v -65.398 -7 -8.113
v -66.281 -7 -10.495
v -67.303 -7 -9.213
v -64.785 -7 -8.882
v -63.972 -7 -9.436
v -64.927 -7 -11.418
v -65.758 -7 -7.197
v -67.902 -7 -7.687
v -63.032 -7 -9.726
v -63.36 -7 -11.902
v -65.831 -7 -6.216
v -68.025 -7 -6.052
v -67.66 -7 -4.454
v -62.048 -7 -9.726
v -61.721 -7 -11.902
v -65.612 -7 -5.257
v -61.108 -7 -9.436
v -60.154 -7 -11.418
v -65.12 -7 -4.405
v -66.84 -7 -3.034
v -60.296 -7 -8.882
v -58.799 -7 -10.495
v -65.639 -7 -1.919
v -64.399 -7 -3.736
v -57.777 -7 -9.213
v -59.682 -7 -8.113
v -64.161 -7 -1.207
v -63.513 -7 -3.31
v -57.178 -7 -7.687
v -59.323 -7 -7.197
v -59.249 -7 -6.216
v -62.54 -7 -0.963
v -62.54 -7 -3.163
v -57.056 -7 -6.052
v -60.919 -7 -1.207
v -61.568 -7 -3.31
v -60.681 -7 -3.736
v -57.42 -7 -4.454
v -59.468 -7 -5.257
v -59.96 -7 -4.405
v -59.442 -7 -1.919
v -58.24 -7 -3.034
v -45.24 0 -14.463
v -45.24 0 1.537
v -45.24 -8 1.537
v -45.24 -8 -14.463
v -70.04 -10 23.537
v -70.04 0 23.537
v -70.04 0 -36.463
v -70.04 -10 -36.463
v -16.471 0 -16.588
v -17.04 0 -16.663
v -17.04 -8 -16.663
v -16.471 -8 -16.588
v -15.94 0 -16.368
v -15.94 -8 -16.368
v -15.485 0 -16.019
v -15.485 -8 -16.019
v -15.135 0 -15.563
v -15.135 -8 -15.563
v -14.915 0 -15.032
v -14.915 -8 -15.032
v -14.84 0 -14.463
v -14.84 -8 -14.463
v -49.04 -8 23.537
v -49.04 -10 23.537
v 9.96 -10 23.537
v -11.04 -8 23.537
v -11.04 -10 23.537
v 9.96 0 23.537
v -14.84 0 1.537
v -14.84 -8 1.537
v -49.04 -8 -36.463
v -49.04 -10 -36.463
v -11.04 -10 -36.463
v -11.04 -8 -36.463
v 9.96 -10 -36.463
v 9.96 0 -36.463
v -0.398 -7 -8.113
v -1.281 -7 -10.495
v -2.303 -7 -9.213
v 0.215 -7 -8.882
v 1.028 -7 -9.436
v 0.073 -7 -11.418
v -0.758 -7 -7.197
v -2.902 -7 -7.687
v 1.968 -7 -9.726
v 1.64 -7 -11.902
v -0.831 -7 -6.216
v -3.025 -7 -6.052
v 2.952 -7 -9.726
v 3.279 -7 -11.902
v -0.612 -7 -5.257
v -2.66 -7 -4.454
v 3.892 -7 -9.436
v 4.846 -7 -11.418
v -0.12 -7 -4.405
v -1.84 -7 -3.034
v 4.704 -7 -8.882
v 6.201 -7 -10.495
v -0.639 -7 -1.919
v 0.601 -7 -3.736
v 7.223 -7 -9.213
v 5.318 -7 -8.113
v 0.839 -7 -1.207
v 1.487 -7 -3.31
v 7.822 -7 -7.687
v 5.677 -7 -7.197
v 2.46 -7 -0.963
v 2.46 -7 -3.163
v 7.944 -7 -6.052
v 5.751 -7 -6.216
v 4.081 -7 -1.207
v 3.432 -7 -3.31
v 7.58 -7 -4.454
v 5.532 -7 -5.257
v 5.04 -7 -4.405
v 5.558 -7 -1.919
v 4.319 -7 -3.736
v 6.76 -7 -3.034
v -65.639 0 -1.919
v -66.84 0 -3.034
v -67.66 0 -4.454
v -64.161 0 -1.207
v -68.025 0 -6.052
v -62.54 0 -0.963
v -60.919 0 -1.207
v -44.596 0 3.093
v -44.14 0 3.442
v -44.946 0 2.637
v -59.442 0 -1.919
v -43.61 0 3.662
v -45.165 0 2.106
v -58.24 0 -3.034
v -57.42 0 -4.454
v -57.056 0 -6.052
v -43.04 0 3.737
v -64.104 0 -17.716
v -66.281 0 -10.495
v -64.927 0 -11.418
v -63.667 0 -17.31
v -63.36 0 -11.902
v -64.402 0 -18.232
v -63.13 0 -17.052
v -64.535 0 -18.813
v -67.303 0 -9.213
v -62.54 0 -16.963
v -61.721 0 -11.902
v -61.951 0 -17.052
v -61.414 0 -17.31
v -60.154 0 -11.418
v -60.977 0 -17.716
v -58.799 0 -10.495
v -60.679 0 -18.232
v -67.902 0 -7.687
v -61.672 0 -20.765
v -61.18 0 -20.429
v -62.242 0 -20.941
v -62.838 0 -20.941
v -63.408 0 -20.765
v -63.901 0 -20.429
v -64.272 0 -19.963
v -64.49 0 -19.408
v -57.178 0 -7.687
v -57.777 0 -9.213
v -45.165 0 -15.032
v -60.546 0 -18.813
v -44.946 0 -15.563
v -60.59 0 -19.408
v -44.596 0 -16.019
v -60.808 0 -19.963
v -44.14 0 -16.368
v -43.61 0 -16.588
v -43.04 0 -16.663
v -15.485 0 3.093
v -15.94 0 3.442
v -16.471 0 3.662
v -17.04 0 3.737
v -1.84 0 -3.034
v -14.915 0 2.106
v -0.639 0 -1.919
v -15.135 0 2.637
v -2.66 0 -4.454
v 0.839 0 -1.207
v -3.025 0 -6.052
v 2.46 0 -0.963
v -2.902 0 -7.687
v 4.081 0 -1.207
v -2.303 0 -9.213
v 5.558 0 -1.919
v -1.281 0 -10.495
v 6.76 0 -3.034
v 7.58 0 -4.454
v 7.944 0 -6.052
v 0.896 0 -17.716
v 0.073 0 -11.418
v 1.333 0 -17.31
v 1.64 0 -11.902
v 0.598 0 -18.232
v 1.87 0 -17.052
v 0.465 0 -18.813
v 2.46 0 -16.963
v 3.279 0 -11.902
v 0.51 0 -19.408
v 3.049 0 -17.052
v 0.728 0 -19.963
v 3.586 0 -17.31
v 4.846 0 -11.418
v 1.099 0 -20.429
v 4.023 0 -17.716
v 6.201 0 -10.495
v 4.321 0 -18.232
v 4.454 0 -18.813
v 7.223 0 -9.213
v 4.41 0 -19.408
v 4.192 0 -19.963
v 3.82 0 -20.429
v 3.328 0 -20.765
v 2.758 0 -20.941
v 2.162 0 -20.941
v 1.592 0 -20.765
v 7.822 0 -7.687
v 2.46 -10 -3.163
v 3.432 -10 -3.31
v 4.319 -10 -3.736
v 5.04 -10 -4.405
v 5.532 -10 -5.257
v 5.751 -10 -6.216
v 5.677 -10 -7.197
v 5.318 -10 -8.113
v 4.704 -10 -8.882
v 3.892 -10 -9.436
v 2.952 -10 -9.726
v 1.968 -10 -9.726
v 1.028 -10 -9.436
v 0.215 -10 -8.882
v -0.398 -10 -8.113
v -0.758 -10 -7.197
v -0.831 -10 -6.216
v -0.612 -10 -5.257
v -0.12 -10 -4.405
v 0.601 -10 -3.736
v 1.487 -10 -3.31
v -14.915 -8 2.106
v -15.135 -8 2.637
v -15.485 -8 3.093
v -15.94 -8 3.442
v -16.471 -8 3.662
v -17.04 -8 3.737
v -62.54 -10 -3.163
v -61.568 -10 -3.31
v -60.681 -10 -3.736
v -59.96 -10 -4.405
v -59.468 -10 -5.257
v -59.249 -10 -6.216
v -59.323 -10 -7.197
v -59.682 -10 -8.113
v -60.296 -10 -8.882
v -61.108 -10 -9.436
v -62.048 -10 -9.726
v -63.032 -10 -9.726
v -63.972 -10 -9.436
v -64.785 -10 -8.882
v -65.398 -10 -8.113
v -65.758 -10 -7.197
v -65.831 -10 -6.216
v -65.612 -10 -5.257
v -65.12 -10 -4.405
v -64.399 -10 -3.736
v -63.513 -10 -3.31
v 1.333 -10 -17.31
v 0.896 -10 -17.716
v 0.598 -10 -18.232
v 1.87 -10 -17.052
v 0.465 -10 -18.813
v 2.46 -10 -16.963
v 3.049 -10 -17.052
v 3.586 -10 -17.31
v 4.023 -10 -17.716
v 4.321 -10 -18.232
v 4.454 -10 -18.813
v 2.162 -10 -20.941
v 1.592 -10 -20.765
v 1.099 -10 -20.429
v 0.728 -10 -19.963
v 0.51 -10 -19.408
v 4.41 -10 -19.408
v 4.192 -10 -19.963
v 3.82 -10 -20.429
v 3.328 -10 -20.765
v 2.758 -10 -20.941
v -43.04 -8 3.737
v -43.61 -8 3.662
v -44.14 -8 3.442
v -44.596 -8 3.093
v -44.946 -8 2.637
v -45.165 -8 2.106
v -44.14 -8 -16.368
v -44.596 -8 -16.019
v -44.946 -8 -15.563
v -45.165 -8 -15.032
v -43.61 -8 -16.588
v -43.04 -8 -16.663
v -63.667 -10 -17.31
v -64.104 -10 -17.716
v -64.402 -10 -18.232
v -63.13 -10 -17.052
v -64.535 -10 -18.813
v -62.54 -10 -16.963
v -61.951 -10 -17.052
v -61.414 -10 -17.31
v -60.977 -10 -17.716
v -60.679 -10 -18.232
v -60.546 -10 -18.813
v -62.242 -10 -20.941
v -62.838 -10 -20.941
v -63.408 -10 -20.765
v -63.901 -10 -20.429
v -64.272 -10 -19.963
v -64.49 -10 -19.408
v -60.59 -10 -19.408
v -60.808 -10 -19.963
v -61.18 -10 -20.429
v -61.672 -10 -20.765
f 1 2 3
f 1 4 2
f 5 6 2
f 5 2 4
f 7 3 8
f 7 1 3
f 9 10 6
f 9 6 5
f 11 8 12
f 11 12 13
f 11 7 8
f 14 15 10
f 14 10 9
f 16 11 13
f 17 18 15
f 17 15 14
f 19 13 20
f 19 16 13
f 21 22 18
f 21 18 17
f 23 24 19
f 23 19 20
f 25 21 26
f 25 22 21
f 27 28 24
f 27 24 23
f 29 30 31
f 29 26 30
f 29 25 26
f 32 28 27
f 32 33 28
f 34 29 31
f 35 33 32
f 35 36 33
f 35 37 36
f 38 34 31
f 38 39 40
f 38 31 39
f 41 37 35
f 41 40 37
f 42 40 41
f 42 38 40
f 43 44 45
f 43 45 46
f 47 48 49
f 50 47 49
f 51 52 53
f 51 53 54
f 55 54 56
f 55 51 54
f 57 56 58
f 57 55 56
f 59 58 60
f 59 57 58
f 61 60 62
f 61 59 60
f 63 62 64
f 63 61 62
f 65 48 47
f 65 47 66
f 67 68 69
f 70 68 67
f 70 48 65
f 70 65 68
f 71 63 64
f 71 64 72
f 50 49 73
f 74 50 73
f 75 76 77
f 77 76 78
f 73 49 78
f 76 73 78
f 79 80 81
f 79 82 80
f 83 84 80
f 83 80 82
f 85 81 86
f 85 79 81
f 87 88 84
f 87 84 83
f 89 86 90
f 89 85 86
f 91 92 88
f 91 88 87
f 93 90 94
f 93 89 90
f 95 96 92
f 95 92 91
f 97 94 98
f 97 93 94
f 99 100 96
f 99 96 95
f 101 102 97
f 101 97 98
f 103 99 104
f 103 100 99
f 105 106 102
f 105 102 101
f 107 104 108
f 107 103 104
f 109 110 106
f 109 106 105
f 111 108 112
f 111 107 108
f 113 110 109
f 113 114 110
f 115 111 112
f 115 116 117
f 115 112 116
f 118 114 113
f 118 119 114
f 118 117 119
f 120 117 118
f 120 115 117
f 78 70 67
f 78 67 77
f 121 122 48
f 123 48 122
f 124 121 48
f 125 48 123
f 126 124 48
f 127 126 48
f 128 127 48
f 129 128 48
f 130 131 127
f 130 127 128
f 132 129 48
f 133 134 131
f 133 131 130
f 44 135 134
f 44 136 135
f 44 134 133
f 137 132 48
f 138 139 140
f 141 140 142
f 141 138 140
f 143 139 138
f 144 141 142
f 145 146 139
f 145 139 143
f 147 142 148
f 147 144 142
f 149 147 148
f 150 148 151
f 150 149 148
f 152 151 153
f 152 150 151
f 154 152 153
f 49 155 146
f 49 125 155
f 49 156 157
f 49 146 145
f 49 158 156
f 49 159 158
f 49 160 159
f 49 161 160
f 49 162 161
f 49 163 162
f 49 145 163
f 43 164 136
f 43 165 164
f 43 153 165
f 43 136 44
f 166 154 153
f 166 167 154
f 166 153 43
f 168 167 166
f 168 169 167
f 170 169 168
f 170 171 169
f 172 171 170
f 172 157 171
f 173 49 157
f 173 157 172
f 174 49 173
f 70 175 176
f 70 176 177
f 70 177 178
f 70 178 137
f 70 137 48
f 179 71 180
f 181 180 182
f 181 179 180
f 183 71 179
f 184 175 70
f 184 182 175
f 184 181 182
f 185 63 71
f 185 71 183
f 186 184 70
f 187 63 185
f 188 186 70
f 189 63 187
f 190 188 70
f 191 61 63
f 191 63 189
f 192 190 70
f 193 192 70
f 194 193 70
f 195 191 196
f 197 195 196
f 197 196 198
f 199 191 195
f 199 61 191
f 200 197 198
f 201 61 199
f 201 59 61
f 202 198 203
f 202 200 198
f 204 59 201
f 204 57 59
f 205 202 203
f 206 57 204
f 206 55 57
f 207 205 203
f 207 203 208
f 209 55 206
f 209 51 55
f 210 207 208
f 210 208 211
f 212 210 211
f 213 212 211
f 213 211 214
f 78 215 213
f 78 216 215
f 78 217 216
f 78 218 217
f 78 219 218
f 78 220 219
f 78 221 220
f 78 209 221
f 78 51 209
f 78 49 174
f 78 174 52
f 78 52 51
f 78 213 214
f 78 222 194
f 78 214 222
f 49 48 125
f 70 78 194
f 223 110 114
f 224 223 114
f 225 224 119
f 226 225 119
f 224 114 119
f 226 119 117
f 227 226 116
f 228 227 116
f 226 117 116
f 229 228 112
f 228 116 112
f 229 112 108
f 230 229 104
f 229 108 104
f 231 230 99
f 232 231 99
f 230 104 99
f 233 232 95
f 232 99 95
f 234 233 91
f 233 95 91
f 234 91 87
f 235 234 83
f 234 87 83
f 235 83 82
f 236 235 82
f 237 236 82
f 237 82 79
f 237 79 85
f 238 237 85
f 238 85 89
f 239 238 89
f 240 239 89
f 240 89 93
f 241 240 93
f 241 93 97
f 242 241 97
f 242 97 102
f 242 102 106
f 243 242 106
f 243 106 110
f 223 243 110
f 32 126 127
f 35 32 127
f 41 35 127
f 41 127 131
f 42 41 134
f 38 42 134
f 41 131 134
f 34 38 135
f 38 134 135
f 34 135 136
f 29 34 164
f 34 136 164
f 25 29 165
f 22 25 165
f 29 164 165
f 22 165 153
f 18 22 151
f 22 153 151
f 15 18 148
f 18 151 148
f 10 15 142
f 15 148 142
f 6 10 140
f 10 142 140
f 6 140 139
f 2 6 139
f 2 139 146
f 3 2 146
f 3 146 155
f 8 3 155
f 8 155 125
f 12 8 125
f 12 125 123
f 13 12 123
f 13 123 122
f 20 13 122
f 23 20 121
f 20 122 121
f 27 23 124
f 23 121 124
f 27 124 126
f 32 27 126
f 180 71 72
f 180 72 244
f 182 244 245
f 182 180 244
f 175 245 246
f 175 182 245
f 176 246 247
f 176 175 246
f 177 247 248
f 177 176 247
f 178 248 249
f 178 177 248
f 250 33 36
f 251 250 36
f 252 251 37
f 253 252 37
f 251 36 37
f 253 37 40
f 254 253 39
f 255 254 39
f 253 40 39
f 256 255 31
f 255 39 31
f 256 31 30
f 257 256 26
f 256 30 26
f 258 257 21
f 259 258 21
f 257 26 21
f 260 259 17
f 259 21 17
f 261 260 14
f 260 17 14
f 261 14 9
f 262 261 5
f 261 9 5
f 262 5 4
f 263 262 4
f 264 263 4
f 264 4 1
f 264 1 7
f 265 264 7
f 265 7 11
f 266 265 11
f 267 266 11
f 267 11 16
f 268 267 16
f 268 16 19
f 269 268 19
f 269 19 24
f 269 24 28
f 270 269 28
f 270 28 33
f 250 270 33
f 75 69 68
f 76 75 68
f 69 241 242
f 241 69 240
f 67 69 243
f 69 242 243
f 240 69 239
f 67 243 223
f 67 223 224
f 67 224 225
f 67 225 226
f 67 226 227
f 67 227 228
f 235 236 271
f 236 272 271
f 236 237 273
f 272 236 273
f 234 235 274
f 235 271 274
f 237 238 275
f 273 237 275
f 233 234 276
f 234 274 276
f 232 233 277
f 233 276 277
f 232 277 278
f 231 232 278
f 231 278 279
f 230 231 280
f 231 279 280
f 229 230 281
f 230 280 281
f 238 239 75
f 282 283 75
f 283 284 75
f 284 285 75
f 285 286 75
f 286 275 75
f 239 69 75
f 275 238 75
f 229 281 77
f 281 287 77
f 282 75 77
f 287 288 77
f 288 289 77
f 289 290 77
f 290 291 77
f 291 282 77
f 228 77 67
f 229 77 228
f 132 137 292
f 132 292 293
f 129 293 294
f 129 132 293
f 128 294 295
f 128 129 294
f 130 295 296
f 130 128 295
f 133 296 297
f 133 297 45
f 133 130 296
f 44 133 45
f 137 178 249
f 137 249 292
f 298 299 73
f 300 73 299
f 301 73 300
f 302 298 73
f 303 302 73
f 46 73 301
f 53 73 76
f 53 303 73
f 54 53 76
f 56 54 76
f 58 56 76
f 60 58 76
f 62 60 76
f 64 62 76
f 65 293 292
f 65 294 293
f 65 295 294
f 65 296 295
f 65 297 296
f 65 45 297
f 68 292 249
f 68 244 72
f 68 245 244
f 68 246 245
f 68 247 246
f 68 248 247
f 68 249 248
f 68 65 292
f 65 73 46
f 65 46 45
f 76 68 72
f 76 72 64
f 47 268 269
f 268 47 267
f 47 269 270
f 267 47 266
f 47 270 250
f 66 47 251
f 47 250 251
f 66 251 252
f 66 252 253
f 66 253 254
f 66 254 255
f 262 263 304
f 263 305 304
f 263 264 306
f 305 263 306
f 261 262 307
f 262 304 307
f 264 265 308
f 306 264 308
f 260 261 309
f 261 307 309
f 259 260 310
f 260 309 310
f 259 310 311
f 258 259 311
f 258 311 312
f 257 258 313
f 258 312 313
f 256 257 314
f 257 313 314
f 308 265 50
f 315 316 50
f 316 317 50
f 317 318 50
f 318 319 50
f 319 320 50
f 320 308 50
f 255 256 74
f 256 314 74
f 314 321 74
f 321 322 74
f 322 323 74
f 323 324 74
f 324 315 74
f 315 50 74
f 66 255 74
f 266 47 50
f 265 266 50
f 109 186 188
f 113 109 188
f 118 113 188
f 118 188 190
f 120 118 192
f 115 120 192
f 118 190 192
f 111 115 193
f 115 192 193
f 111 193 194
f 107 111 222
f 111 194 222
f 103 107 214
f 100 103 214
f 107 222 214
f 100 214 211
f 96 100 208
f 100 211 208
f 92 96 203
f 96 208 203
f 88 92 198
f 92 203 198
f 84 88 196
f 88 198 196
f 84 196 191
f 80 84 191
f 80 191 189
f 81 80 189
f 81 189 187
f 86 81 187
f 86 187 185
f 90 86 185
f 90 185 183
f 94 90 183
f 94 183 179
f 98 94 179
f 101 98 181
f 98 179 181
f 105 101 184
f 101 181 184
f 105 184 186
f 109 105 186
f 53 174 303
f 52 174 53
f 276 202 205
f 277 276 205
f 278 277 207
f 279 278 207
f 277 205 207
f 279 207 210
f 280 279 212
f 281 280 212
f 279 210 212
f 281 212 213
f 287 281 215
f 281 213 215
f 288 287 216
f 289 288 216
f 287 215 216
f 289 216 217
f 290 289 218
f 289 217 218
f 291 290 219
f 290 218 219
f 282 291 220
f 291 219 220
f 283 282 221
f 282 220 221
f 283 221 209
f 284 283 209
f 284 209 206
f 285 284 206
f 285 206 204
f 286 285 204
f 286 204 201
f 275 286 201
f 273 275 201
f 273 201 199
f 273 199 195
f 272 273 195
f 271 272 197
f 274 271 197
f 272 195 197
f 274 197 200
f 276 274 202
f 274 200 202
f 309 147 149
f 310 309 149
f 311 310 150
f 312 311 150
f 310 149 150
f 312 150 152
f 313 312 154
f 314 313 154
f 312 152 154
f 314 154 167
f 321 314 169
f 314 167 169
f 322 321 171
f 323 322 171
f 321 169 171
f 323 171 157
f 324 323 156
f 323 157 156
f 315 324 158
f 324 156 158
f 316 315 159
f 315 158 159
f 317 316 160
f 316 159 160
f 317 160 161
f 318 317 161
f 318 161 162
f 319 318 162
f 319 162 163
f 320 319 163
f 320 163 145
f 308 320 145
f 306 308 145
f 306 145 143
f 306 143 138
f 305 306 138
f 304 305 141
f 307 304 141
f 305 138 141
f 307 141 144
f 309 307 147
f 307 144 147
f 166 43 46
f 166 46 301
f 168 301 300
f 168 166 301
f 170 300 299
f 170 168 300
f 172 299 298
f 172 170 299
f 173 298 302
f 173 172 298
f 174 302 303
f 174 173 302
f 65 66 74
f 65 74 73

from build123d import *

# Parameters (mm, degrees)
SKETCH1_W           = 80
SKETCH1_H           = 60
BOSS_EXTRUDE3_DEPTH = 10
SKETCH2_R           = 5.5
CUT_EXTRUDE2_DEPTH  = 7
SKETCH3_R           = 2
CUT_EXTRUDE3_DEPTH  = 10
CUT_EXTRUDE4_DEPTH  = 8
SKETCH6_W           = 38
SKETCH6_H           = 2
CUT_EXTRUDE5_DEPTH  = 60
SKETCH7_R           = 3.3
CUT_EXTRUDE7_DEPTH  = 13


with BuildPart() as part:
    # Sketch1 → Boss-Extrude3 (new body)
    with BuildSketch(Plane(origin=(0, 0, 0), x_dir=(1, 0, 0), z_dir=(0, 1, 0))):
        with Locations((-30.040251739, 6.462955974)):
            Rectangle(SKETCH1_W, SKETCH1_H)
    extrude(amount=-BOSS_EXTRUDE3_DEPTH)

    # Sketch2 → Cut-Extrude2 (cut)
    with BuildSketch(Plane(origin=(0, 0, 0), x_dir=(1, 0, 0), z_dir=(0, 1, 0))):
        with Locations(Location((-62.540251739, 6.462955974, 0), (0, 0, 270))):
            Circle(SKETCH2_R)
        with Locations(Location((2.459748261, 6.462955974, 0), (0, 0, 270))):
            Circle(SKETCH2_R)
    extrude(amount=-CUT_EXTRUDE2_DEPTH, mode=Mode.SUBTRACT)

    # Sketch3 → Cut-Extrude3 (cut)
    with BuildSketch(Plane(origin=(0, 0, 0), x_dir=(1, 0, 0), z_dir=(0, 1, 0))):
        with Locations(Location((-62.540251739, 18.962955974, 0), (0, 0, 270))):
            Circle(SKETCH3_R)
        with Locations(Location((2.459748261, 18.962955974, 0), (0, 0, 270))):
            Circle(SKETCH3_R)
    extrude(amount=-CUT_EXTRUDE3_DEPTH, mode=Mode.SUBTRACT)

    # Sketch4 → Cut-Extrude4 (cut)
    with BuildSketch(Plane(origin=(0, 0, 0), x_dir=(1, 0, 0), z_dir=(0, 1, 0))):
        with BuildLine():
            Line((-43.040251739, 16.662955974), (-17.040251739, 16.662955974))
            ThreePointArc((-17.040251739, 16.662955974), (-15.48461682, 16.018590892), (-14.840251739, 14.462955974))
            Line((-14.840251739, 14.462955974), (-14.840251739, -1.537044026))
            ThreePointArc((-14.840251739, -1.537044026), (-15.48461682, -3.092678945), (-17.040251739, -3.737044026))
            Line((-17.040251739, -3.737044026), (-43.040251739, -3.737044026))
            ThreePointArc((-43.040251739, -3.737044026), (-44.595886658, -3.092678945), (-45.240251739, -1.537044026))
            Line((-45.240251739, -1.537044026), (-45.240251739, 14.462955974))
            ThreePointArc((-45.240251739, 14.462955974), (-44.595886658, 16.018590892), (-43.040251739, 16.662955974))
        make_face()
    extrude(amount=-CUT_EXTRUDE4_DEPTH, mode=Mode.SUBTRACT)

    # Sketch6 → Cut-Extrude5 (cut)
    with BuildSketch(Plane.XY.offset(23.537044026)):
        with Locations((-30.040251739, -9)):
            Rectangle(SKETCH6_W, SKETCH6_H)
    extrude(amount=-CUT_EXTRUDE5_DEPTH, mode=Mode.SUBTRACT)

    # Sketch7 → Cut-Extrude7 (cut)
    with BuildSketch(Plane(origin=(0, 0, 0), x_dir=(1, 0, 0), z_dir=(0, 1, 0))):
        with Locations(Location((-62.540251739, 6.462955974, 0), (0, 0, 270))):
            Circle(SKETCH7_R)
        with Locations(Location((2.459748261, 6.462955974, 0), (0, 0, 270))):
            Circle(SKETCH7_R)
    extrude(amount=-CUT_EXTRUDE7_DEPTH, mode=Mode.SUBTRACT)


solid = part.part
